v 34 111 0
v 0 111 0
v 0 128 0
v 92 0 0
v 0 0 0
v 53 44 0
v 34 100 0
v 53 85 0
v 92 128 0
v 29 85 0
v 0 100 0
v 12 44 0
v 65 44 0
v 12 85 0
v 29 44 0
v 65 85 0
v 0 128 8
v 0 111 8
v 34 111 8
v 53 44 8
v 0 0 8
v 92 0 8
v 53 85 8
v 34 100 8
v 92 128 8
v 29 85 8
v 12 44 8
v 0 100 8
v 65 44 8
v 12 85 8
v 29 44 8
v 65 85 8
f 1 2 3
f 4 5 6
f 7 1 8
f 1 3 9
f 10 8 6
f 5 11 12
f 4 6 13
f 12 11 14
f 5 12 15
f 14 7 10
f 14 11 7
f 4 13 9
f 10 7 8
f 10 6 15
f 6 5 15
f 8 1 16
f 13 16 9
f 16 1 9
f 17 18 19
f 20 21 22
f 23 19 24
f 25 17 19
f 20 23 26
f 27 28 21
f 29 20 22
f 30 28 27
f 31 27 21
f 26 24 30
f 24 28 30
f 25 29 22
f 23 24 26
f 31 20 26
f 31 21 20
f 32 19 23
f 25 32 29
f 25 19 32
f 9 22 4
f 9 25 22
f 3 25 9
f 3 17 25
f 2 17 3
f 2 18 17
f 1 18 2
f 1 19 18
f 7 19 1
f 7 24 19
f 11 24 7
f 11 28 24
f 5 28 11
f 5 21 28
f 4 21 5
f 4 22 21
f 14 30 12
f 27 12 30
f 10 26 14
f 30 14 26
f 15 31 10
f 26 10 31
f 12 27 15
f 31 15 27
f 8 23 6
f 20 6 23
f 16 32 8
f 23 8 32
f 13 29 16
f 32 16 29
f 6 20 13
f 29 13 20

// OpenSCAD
module face(y,z=8.0) {
    ratio = 0.71875;
    x = y * ratio;

    linear_extrude(z) {
        difference() {
            // Blank
            polygon([[0,0], [x,0], [x,y], [0,y]]);

            // Eye (large)
            polygon([[12,44],[29,44],[29,85],[12,85]]);

            // Eye (small)
            polygon([[53,44],[65,44],[65,85],[53,85]]);

            // Mouth
            polygon([[0,100],[34,100],[34,111],[0,111]]);
        }
    }
}

face(128.0);
